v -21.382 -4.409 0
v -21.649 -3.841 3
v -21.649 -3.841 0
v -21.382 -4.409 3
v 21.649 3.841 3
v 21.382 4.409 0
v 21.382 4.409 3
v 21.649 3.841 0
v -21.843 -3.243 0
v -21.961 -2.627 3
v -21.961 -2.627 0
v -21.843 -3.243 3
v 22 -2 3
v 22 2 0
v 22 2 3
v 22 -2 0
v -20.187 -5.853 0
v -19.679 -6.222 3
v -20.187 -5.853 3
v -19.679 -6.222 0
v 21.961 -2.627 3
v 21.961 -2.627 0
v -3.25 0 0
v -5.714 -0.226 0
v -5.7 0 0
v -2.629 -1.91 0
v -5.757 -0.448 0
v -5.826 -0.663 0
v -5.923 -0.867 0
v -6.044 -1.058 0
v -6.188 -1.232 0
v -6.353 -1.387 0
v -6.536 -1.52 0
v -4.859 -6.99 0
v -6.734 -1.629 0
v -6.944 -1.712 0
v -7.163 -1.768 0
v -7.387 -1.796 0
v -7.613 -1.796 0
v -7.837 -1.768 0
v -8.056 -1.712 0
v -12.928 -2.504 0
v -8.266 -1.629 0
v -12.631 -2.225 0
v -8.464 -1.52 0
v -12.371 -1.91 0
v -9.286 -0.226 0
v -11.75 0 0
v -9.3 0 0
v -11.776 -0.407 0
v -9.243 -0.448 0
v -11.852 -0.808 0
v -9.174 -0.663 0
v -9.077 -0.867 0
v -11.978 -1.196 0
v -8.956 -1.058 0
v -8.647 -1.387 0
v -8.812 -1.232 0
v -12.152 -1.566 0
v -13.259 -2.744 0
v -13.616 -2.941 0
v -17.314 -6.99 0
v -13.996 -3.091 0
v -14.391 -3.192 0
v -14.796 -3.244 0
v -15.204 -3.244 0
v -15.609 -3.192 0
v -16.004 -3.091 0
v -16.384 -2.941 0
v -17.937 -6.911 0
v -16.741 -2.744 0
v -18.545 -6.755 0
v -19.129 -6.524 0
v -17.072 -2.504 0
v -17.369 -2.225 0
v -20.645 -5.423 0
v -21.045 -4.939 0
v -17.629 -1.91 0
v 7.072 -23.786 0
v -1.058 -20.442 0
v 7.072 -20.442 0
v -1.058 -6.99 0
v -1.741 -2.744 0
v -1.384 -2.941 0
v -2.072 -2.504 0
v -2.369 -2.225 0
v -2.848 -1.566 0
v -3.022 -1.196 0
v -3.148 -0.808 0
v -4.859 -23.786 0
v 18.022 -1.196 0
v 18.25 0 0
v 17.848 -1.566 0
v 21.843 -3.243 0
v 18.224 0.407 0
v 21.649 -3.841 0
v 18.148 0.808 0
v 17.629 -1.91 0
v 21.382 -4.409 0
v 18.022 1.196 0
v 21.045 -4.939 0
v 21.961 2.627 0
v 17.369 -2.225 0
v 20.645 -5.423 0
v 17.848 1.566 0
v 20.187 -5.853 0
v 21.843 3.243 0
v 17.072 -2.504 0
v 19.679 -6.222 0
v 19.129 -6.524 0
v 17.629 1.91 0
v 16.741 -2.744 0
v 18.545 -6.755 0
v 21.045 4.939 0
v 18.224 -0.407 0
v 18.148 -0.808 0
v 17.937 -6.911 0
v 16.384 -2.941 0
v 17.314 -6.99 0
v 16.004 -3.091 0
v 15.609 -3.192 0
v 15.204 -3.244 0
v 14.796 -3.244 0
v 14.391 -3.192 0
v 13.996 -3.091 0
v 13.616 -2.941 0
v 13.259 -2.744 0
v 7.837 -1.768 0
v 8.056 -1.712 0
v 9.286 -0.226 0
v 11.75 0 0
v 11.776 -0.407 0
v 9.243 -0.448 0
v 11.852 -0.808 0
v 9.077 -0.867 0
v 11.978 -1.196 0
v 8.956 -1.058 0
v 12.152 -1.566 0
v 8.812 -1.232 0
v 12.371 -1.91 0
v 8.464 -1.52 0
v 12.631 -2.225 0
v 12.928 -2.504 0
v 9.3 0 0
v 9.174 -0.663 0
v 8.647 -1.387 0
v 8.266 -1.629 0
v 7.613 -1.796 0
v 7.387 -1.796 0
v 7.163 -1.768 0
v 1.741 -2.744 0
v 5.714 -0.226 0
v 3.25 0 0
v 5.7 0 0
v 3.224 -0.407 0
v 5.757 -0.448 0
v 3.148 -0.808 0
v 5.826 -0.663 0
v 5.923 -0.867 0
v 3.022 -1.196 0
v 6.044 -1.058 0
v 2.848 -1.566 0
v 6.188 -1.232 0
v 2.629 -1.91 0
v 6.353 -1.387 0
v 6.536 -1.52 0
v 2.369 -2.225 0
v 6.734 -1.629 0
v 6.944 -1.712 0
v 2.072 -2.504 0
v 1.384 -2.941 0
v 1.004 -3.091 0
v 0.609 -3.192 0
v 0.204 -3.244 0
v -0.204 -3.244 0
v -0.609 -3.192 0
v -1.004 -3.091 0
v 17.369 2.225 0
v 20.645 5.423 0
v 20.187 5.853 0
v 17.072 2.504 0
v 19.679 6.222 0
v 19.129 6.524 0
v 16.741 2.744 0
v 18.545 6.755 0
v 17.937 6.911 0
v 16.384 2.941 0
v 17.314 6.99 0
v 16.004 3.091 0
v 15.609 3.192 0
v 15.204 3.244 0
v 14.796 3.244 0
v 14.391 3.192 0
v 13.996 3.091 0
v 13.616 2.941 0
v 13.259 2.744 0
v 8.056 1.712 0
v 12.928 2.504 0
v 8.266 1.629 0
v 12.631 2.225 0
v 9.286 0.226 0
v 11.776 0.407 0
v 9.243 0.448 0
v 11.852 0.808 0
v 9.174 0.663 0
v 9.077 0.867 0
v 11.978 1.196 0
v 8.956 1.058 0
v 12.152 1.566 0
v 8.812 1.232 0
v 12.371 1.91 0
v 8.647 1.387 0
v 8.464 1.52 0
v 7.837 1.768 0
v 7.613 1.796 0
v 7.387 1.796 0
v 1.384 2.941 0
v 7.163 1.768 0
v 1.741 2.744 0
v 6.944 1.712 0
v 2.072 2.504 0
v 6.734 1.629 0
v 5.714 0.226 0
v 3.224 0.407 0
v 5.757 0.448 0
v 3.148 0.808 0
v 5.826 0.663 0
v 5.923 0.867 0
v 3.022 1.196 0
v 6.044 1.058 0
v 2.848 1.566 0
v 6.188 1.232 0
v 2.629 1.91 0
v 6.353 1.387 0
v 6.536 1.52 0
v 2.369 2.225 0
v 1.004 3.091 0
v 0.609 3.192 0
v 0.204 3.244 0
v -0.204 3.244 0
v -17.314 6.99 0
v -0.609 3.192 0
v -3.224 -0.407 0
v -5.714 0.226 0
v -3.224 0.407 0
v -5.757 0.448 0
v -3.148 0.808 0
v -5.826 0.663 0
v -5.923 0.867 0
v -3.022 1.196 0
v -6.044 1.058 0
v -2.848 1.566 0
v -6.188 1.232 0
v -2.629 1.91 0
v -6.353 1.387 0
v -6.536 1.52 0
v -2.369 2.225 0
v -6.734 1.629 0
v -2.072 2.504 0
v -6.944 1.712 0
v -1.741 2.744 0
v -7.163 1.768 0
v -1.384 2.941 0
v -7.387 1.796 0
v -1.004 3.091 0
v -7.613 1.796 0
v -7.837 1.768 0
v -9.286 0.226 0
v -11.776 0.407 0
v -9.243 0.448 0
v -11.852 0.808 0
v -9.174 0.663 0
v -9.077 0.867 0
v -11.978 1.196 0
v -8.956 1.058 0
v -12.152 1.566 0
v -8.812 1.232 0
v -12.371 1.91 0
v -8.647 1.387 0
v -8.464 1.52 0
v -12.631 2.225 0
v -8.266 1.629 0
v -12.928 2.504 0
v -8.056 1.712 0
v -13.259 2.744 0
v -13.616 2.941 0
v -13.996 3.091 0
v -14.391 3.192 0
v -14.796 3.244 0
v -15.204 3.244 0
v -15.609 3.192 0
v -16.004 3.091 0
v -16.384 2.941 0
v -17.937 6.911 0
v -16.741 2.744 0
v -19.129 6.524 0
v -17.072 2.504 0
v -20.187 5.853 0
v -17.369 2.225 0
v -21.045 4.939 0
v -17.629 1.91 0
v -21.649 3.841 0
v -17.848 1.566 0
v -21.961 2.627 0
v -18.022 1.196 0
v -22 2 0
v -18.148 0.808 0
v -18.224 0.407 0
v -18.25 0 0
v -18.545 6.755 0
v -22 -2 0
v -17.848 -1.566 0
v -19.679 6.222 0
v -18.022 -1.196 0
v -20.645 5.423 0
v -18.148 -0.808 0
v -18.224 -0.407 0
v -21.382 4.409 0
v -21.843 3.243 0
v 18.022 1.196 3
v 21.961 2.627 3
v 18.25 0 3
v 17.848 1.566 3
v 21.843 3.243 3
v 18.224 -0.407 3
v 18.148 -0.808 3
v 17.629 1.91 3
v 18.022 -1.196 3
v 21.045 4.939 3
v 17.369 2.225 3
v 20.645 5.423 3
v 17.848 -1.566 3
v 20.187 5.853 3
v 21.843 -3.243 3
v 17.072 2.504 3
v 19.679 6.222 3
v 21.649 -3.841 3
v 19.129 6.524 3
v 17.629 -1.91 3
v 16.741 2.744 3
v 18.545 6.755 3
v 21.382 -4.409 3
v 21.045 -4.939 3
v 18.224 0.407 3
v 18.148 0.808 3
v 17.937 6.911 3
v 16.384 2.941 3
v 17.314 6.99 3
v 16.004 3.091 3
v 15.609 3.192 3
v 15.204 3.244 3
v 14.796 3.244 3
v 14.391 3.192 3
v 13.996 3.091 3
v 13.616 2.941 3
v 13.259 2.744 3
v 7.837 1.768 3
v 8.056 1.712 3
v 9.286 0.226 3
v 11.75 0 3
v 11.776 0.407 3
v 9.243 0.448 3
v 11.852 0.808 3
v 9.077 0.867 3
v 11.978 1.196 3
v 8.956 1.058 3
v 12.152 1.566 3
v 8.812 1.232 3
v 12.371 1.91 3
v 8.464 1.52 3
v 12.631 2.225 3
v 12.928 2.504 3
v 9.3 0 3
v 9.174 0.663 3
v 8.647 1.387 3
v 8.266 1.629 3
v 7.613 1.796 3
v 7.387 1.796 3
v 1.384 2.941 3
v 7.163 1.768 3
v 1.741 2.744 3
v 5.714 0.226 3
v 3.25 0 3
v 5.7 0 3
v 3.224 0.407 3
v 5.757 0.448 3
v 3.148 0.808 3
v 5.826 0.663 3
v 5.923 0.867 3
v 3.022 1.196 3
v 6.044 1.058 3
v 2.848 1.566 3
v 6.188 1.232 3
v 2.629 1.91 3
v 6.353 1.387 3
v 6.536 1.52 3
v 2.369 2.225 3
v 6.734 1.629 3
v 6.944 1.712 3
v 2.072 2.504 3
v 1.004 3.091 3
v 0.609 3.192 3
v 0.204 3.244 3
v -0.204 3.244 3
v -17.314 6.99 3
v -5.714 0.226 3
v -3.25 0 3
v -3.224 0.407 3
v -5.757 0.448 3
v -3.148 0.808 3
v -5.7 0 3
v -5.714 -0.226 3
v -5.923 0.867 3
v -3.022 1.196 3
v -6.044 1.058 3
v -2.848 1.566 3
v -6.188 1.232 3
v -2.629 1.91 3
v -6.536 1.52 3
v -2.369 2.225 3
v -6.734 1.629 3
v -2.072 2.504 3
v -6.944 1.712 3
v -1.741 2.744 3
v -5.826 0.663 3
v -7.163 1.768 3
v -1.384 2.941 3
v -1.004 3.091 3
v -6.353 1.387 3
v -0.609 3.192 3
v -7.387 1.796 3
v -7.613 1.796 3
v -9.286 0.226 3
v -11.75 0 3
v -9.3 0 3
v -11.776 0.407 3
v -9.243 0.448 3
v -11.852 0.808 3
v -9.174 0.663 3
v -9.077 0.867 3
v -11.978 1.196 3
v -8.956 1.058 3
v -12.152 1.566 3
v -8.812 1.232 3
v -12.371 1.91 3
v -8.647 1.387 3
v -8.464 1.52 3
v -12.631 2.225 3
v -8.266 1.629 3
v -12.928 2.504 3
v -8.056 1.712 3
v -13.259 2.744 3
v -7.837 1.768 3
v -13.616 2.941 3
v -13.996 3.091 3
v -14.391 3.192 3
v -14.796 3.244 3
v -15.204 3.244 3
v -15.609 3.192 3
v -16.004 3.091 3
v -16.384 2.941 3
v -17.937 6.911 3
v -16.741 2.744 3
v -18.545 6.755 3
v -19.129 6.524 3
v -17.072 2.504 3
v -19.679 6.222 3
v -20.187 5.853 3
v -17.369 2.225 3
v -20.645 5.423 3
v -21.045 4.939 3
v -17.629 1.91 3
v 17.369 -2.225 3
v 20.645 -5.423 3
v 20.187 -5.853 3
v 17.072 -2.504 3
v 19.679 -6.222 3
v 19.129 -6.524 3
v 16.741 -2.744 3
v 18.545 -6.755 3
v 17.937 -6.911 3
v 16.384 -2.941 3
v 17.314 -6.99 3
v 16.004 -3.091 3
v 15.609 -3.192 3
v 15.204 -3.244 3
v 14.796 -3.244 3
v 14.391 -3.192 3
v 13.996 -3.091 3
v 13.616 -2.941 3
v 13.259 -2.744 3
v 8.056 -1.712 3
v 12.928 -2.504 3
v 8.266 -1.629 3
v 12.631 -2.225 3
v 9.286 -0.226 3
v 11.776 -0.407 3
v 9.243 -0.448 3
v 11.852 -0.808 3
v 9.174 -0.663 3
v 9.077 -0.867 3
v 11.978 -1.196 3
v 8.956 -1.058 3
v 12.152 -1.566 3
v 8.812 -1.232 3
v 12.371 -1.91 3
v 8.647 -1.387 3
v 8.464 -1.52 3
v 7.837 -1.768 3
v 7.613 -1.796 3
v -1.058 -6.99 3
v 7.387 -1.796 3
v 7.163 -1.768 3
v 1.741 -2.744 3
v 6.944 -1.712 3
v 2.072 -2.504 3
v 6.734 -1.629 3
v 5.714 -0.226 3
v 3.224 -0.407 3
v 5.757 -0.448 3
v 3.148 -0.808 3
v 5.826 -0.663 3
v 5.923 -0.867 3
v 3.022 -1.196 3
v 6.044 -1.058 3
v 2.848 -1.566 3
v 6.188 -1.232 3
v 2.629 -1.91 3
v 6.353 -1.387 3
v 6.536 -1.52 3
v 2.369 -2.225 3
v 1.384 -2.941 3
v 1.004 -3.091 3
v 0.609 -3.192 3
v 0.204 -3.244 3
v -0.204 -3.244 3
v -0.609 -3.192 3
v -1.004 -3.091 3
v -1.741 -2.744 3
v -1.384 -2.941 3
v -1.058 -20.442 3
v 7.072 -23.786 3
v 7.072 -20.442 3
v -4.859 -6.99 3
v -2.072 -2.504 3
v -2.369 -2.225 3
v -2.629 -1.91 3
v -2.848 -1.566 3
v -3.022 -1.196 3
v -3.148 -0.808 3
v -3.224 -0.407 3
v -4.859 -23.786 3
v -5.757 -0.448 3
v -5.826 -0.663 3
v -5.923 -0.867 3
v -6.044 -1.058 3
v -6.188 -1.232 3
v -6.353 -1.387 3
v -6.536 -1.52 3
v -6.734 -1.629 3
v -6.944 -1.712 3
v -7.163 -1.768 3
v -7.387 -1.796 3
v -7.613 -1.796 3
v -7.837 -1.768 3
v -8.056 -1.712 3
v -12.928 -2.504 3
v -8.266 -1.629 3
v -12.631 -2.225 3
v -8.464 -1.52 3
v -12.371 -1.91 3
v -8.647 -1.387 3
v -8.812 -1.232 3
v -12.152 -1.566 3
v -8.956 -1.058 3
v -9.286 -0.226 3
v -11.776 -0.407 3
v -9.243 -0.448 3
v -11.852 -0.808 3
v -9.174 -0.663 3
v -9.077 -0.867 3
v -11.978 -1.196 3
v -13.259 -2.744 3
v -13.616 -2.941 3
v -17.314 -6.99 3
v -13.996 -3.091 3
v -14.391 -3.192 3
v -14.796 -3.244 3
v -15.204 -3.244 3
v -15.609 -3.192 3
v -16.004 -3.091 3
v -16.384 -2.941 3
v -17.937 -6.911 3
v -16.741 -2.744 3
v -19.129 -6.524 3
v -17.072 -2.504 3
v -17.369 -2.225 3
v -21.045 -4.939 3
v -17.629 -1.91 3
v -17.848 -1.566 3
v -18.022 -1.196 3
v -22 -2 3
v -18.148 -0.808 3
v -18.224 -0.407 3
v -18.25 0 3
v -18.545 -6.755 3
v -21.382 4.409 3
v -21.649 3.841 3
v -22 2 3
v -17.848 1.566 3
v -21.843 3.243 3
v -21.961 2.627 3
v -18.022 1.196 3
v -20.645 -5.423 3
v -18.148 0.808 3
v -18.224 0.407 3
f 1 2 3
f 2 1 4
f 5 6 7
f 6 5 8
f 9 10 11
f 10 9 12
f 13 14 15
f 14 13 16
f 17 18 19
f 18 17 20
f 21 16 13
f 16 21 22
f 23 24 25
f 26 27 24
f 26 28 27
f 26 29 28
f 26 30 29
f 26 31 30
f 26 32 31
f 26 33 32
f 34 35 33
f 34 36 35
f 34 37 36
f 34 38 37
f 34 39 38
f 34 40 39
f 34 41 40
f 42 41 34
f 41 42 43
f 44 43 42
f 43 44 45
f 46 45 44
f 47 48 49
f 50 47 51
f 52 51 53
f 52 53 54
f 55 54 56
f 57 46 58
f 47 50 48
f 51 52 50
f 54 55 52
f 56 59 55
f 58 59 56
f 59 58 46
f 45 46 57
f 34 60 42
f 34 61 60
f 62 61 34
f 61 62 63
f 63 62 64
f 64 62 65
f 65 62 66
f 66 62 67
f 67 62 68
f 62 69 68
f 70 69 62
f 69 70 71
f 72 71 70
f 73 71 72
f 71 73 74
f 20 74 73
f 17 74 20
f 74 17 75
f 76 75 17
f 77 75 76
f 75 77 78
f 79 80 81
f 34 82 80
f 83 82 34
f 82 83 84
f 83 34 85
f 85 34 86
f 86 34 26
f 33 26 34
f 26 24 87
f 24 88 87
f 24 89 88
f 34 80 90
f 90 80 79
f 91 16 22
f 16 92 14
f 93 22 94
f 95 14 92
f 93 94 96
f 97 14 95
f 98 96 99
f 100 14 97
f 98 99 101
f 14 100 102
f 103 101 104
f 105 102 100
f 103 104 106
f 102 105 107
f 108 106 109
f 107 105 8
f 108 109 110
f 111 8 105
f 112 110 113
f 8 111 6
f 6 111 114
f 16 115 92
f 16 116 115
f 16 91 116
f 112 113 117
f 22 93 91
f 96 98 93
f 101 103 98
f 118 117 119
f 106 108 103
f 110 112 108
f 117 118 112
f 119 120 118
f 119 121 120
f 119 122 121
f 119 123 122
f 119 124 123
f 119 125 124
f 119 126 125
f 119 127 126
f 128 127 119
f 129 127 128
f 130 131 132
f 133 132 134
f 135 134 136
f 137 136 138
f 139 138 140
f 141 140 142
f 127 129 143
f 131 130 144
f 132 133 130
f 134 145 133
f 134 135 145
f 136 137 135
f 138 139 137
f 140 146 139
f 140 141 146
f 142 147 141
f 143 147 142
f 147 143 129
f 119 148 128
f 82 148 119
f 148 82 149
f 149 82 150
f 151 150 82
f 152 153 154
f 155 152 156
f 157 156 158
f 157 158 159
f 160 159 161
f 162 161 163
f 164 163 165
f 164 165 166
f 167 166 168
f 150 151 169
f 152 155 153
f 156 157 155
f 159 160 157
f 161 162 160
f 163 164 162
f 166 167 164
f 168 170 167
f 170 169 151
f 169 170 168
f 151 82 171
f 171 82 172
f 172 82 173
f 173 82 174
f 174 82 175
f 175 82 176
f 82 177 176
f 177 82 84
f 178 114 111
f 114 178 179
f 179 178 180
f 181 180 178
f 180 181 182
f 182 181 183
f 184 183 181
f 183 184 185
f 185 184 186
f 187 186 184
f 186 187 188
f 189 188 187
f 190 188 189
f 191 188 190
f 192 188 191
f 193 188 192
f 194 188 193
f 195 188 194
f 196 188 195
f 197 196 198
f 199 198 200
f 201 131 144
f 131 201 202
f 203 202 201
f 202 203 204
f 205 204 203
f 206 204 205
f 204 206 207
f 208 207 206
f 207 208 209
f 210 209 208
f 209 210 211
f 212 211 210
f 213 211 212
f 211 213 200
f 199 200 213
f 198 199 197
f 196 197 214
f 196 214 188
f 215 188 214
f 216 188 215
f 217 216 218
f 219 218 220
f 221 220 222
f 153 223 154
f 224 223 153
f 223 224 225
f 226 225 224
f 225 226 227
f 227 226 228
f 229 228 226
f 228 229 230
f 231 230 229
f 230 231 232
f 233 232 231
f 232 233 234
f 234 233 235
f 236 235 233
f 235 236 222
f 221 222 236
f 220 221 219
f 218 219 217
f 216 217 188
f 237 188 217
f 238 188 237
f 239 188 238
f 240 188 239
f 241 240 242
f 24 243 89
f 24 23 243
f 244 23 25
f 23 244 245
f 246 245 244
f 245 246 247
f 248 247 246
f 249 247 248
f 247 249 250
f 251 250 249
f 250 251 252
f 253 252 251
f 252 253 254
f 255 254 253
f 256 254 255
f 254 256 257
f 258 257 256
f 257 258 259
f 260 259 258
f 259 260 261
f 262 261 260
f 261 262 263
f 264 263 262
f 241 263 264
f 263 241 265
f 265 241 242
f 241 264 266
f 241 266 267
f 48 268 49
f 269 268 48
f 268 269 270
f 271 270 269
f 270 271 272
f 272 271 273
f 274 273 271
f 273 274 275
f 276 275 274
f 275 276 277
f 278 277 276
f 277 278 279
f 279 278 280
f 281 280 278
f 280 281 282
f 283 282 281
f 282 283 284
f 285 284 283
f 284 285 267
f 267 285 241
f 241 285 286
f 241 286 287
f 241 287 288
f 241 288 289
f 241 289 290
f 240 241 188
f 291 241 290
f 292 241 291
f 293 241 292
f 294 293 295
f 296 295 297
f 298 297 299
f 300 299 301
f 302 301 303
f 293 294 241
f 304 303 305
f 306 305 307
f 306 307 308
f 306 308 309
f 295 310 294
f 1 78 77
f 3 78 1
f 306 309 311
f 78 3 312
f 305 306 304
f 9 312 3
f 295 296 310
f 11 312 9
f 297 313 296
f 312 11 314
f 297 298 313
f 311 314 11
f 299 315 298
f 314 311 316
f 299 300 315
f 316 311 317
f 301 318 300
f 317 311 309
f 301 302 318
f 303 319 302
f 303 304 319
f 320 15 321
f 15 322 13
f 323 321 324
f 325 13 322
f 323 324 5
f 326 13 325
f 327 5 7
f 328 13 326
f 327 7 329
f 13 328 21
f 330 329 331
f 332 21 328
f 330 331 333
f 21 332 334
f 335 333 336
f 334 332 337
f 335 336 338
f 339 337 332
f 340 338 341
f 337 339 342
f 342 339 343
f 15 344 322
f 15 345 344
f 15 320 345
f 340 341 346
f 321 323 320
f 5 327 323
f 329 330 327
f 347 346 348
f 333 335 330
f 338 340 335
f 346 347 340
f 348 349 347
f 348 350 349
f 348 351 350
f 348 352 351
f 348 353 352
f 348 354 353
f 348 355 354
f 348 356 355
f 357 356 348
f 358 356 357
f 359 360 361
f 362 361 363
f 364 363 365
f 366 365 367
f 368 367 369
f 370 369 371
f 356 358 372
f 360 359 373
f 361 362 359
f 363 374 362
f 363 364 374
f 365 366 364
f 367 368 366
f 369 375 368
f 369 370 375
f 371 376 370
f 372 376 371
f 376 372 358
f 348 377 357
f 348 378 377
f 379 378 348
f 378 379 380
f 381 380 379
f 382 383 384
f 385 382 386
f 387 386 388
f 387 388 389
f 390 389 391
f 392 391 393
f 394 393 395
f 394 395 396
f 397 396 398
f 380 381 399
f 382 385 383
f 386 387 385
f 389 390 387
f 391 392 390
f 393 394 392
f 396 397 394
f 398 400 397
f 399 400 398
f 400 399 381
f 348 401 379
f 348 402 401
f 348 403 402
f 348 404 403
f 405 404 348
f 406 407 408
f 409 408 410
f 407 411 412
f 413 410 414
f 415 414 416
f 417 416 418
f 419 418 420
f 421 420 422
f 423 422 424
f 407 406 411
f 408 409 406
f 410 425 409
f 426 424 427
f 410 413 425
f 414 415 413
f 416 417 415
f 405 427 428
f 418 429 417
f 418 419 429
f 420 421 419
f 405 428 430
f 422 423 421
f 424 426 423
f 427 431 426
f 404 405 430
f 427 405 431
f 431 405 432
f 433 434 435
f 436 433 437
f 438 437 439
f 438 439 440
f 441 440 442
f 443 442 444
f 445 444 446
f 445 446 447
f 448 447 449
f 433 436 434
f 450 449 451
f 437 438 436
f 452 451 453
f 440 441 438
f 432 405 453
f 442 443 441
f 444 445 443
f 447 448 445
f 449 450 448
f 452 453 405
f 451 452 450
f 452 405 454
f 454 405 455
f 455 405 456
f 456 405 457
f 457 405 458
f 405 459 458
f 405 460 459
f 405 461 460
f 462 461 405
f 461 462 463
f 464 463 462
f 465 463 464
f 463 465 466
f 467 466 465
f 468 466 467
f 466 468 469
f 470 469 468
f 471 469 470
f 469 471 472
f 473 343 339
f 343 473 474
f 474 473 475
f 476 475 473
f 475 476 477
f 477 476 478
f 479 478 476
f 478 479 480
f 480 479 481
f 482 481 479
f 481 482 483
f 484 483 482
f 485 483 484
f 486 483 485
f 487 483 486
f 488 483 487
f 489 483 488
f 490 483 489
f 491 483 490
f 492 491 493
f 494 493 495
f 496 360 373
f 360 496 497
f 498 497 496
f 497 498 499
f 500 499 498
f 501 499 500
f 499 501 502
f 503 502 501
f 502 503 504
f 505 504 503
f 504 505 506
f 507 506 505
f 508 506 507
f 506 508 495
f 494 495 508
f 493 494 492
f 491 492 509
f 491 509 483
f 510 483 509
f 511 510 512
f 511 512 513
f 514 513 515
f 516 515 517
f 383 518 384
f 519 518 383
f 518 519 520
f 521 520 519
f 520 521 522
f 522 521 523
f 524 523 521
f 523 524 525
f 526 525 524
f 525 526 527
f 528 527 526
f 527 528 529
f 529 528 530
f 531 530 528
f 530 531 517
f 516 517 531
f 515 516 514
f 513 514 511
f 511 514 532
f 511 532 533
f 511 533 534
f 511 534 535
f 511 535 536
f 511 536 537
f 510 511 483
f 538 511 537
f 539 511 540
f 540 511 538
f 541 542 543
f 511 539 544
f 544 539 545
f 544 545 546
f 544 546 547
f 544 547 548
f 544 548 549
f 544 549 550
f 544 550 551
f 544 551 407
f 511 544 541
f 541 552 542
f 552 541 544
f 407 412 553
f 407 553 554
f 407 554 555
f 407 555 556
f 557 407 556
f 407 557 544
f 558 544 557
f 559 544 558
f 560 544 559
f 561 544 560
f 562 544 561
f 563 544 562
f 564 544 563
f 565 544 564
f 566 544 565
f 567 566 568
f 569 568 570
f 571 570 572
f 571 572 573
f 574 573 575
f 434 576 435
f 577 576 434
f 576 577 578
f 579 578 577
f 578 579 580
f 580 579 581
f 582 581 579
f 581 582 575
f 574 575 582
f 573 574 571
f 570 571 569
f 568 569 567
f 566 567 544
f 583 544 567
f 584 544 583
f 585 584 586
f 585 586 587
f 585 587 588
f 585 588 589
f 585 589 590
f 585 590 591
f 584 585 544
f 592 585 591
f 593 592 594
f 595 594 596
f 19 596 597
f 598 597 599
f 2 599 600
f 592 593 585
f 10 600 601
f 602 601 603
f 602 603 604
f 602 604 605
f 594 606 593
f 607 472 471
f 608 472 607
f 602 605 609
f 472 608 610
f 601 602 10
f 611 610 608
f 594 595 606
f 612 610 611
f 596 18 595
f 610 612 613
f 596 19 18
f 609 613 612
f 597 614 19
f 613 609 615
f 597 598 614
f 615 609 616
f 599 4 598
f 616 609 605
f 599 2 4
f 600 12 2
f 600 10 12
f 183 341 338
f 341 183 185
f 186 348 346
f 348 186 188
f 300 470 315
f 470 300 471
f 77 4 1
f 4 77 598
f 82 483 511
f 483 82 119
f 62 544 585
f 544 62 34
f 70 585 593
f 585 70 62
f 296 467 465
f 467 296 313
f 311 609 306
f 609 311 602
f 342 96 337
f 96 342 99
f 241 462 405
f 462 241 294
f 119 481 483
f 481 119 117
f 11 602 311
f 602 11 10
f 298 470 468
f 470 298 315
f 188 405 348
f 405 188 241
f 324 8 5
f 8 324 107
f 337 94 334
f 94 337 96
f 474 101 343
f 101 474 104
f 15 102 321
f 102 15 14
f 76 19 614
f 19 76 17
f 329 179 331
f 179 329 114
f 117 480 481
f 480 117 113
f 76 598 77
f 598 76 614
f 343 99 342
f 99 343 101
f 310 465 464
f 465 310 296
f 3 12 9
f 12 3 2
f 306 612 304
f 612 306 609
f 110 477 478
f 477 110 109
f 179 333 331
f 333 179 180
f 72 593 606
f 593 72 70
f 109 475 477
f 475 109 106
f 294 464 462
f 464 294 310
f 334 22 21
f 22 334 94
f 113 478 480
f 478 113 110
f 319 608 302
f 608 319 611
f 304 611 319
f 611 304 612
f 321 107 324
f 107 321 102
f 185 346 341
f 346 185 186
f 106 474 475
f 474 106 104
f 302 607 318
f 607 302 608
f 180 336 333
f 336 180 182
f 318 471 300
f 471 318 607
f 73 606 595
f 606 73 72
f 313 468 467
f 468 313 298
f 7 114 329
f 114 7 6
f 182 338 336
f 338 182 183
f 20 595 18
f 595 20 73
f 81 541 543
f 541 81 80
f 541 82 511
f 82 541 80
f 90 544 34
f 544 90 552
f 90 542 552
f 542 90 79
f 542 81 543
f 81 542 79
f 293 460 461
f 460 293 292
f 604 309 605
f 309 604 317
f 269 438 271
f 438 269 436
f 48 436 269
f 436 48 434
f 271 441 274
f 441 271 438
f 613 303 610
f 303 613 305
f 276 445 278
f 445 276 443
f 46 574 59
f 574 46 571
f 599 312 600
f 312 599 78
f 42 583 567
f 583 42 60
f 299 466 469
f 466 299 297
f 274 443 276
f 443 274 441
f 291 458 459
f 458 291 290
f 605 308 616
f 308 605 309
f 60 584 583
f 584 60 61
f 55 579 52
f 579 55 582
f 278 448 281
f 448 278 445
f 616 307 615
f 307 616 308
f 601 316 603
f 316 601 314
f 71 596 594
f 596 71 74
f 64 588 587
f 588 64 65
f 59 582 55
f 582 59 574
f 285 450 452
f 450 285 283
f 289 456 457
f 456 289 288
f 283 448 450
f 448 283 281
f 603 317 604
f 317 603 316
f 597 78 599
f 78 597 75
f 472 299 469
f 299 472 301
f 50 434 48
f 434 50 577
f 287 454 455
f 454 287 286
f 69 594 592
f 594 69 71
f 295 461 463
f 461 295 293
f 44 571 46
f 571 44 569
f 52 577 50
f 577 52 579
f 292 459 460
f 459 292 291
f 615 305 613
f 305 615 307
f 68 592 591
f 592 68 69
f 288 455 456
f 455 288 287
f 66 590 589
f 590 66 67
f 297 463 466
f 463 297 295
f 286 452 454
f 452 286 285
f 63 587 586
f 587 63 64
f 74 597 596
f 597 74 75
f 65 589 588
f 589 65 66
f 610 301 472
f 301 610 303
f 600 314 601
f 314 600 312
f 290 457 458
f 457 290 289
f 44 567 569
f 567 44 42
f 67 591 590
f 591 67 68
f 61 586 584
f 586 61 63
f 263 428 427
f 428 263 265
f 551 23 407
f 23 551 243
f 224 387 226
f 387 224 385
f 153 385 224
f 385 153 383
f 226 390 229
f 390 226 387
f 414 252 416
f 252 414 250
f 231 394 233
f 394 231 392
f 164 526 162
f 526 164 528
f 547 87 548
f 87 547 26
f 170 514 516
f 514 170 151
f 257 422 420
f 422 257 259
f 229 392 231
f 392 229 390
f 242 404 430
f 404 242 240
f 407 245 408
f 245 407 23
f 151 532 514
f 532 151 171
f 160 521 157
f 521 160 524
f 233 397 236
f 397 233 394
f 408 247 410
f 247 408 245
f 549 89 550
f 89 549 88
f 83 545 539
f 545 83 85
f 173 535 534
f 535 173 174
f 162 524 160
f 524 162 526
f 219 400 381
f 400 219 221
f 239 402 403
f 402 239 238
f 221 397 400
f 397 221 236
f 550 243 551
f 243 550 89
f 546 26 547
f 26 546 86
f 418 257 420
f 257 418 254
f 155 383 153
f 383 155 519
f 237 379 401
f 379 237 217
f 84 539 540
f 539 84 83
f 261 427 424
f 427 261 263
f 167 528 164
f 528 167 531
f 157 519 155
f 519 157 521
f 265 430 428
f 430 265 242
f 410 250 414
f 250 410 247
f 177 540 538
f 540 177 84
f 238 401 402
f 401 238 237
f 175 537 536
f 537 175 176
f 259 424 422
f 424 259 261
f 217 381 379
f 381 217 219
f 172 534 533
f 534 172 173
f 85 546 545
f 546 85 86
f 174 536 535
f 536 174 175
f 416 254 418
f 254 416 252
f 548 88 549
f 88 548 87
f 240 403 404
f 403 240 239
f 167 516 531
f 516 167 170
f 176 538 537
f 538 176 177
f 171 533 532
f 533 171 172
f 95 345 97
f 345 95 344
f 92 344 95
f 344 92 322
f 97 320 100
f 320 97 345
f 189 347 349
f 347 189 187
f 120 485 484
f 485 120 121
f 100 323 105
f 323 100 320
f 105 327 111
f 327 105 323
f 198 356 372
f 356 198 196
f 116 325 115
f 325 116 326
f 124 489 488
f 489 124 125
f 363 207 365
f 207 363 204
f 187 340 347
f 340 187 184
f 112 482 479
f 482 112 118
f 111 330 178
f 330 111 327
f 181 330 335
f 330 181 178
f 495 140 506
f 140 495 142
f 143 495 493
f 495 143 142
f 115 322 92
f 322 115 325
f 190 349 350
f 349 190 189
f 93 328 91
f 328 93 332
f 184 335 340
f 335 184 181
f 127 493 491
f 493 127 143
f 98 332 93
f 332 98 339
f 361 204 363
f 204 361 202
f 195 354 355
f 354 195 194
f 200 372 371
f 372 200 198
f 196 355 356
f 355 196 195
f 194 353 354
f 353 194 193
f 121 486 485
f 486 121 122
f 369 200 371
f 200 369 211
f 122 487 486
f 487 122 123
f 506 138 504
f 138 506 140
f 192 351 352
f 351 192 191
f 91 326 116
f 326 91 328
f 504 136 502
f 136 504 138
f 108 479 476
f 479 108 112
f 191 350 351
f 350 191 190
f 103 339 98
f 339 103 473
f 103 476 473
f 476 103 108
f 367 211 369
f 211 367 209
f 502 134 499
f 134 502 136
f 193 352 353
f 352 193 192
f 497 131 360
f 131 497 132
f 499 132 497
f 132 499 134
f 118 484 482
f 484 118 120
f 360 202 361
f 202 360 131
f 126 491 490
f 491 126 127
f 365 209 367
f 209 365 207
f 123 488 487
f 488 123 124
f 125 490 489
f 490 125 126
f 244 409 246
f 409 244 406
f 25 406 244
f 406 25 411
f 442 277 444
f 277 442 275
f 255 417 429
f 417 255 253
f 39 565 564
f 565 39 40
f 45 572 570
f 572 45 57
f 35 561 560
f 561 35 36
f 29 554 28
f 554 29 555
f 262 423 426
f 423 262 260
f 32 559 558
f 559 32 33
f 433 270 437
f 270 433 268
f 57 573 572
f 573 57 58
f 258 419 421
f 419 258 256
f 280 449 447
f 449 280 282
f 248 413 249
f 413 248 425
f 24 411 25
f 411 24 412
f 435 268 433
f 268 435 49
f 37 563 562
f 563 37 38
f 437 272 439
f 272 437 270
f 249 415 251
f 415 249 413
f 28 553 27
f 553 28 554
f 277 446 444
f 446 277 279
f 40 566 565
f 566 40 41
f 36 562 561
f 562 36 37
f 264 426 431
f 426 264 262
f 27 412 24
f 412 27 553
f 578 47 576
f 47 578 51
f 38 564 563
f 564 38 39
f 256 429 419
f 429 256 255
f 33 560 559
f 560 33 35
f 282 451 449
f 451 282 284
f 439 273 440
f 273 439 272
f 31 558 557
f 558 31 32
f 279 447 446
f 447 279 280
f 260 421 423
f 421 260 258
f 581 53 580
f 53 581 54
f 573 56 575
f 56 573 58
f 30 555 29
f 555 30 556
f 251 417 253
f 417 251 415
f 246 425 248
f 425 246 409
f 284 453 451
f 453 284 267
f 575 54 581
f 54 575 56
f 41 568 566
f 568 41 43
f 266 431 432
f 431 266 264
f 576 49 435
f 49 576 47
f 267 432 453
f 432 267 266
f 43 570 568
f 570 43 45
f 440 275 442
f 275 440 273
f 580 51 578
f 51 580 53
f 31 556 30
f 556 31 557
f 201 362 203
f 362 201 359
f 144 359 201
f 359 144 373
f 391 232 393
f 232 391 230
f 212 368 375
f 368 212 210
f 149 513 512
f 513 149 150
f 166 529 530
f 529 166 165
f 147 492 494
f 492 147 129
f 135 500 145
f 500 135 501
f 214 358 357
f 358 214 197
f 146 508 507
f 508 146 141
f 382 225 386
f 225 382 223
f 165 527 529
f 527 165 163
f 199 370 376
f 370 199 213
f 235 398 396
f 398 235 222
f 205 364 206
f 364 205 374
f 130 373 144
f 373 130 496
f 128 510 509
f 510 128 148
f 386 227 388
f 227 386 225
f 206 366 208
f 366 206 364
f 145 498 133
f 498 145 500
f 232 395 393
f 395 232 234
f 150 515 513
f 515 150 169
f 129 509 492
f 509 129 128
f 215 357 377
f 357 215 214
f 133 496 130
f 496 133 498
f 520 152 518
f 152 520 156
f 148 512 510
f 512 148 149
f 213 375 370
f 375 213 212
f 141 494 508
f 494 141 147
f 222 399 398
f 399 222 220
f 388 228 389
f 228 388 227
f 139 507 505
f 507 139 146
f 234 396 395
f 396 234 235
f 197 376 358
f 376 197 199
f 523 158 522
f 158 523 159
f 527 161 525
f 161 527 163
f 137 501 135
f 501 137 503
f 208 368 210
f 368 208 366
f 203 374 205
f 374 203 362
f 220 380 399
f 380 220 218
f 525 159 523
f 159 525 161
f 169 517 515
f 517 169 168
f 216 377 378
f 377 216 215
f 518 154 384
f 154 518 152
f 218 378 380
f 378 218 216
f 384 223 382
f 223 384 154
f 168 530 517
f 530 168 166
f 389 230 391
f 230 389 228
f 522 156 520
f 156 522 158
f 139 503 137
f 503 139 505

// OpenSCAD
$fn = 50;


difference() {
	union() {
		hull() {
			translate(v = [-17.0000000000, 2.0000000000, 0]) {
				cylinder(h = 3, r = 5);
			}
			translate(v = [17.0000000000, 2.0000000000, 0]) {
				cylinder(h = 3, r = 5);
			}
			translate(v = [-17.0000000000, -2.0000000000, 0]) {
				cylinder(h = 3, r = 5);
			}
			translate(v = [17.0000000000, -2.0000000000, 0]) {
				cylinder(h = 3, r = 5);
			}
		}
		translate(v = [0, -5, 0]) {
			linear_extrude(height = 3) {
				text(font = "DejaVu Sans Mono:style=Bold", halign = "center", size = 19.0000000000, text = "L", valign = "top");
			}
		}
	}
	union() {
		translate(v = [-15.0000000000, 0.0000000000, 0]) {
			translate(v = [0, 0, -100]) {
				cylinder(h = 200, r = 3.2500000000);
			}
		}
		translate(v = [0, 0, -100]) {
			cylinder(h = 200, r = 3.2500000000);
		}
		translate(v = [15.0000000000, 0.0000000000, 0]) {
			translate(v = [0, 0, -100]) {
				cylinder(h = 200, r = 3.2500000000);
			}
		}
		translate(v = [-15.0000000000, 0.0000000000, 0]) {
			translate(v = [0, 0, -100]) {
				cylinder(h = 200, r = 1.8000000000);
			}
		}
		translate(v = [-7.5000000000, 0.0000000000, 0]) {
			translate(v = [0, 0, -100]) {
				cylinder(h = 200, r = 1.8000000000);
			}
		}
		translate(v = [0, 0, -100]) {
			cylinder(h = 200, r = 1.8000000000);
		}
		translate(v = [7.5000000000, 0.0000000000, 0]) {
			translate(v = [0, 0, -100]) {
				cylinder(h = 200, r = 1.8000000000);
			}
		}
		translate(v = [15.0000000000, 0.0000000000, 0]) {
			translate(v = [0, 0, -100]) {
				cylinder(h = 200, r = 1.8000000000);
			}
		}
	}
}
